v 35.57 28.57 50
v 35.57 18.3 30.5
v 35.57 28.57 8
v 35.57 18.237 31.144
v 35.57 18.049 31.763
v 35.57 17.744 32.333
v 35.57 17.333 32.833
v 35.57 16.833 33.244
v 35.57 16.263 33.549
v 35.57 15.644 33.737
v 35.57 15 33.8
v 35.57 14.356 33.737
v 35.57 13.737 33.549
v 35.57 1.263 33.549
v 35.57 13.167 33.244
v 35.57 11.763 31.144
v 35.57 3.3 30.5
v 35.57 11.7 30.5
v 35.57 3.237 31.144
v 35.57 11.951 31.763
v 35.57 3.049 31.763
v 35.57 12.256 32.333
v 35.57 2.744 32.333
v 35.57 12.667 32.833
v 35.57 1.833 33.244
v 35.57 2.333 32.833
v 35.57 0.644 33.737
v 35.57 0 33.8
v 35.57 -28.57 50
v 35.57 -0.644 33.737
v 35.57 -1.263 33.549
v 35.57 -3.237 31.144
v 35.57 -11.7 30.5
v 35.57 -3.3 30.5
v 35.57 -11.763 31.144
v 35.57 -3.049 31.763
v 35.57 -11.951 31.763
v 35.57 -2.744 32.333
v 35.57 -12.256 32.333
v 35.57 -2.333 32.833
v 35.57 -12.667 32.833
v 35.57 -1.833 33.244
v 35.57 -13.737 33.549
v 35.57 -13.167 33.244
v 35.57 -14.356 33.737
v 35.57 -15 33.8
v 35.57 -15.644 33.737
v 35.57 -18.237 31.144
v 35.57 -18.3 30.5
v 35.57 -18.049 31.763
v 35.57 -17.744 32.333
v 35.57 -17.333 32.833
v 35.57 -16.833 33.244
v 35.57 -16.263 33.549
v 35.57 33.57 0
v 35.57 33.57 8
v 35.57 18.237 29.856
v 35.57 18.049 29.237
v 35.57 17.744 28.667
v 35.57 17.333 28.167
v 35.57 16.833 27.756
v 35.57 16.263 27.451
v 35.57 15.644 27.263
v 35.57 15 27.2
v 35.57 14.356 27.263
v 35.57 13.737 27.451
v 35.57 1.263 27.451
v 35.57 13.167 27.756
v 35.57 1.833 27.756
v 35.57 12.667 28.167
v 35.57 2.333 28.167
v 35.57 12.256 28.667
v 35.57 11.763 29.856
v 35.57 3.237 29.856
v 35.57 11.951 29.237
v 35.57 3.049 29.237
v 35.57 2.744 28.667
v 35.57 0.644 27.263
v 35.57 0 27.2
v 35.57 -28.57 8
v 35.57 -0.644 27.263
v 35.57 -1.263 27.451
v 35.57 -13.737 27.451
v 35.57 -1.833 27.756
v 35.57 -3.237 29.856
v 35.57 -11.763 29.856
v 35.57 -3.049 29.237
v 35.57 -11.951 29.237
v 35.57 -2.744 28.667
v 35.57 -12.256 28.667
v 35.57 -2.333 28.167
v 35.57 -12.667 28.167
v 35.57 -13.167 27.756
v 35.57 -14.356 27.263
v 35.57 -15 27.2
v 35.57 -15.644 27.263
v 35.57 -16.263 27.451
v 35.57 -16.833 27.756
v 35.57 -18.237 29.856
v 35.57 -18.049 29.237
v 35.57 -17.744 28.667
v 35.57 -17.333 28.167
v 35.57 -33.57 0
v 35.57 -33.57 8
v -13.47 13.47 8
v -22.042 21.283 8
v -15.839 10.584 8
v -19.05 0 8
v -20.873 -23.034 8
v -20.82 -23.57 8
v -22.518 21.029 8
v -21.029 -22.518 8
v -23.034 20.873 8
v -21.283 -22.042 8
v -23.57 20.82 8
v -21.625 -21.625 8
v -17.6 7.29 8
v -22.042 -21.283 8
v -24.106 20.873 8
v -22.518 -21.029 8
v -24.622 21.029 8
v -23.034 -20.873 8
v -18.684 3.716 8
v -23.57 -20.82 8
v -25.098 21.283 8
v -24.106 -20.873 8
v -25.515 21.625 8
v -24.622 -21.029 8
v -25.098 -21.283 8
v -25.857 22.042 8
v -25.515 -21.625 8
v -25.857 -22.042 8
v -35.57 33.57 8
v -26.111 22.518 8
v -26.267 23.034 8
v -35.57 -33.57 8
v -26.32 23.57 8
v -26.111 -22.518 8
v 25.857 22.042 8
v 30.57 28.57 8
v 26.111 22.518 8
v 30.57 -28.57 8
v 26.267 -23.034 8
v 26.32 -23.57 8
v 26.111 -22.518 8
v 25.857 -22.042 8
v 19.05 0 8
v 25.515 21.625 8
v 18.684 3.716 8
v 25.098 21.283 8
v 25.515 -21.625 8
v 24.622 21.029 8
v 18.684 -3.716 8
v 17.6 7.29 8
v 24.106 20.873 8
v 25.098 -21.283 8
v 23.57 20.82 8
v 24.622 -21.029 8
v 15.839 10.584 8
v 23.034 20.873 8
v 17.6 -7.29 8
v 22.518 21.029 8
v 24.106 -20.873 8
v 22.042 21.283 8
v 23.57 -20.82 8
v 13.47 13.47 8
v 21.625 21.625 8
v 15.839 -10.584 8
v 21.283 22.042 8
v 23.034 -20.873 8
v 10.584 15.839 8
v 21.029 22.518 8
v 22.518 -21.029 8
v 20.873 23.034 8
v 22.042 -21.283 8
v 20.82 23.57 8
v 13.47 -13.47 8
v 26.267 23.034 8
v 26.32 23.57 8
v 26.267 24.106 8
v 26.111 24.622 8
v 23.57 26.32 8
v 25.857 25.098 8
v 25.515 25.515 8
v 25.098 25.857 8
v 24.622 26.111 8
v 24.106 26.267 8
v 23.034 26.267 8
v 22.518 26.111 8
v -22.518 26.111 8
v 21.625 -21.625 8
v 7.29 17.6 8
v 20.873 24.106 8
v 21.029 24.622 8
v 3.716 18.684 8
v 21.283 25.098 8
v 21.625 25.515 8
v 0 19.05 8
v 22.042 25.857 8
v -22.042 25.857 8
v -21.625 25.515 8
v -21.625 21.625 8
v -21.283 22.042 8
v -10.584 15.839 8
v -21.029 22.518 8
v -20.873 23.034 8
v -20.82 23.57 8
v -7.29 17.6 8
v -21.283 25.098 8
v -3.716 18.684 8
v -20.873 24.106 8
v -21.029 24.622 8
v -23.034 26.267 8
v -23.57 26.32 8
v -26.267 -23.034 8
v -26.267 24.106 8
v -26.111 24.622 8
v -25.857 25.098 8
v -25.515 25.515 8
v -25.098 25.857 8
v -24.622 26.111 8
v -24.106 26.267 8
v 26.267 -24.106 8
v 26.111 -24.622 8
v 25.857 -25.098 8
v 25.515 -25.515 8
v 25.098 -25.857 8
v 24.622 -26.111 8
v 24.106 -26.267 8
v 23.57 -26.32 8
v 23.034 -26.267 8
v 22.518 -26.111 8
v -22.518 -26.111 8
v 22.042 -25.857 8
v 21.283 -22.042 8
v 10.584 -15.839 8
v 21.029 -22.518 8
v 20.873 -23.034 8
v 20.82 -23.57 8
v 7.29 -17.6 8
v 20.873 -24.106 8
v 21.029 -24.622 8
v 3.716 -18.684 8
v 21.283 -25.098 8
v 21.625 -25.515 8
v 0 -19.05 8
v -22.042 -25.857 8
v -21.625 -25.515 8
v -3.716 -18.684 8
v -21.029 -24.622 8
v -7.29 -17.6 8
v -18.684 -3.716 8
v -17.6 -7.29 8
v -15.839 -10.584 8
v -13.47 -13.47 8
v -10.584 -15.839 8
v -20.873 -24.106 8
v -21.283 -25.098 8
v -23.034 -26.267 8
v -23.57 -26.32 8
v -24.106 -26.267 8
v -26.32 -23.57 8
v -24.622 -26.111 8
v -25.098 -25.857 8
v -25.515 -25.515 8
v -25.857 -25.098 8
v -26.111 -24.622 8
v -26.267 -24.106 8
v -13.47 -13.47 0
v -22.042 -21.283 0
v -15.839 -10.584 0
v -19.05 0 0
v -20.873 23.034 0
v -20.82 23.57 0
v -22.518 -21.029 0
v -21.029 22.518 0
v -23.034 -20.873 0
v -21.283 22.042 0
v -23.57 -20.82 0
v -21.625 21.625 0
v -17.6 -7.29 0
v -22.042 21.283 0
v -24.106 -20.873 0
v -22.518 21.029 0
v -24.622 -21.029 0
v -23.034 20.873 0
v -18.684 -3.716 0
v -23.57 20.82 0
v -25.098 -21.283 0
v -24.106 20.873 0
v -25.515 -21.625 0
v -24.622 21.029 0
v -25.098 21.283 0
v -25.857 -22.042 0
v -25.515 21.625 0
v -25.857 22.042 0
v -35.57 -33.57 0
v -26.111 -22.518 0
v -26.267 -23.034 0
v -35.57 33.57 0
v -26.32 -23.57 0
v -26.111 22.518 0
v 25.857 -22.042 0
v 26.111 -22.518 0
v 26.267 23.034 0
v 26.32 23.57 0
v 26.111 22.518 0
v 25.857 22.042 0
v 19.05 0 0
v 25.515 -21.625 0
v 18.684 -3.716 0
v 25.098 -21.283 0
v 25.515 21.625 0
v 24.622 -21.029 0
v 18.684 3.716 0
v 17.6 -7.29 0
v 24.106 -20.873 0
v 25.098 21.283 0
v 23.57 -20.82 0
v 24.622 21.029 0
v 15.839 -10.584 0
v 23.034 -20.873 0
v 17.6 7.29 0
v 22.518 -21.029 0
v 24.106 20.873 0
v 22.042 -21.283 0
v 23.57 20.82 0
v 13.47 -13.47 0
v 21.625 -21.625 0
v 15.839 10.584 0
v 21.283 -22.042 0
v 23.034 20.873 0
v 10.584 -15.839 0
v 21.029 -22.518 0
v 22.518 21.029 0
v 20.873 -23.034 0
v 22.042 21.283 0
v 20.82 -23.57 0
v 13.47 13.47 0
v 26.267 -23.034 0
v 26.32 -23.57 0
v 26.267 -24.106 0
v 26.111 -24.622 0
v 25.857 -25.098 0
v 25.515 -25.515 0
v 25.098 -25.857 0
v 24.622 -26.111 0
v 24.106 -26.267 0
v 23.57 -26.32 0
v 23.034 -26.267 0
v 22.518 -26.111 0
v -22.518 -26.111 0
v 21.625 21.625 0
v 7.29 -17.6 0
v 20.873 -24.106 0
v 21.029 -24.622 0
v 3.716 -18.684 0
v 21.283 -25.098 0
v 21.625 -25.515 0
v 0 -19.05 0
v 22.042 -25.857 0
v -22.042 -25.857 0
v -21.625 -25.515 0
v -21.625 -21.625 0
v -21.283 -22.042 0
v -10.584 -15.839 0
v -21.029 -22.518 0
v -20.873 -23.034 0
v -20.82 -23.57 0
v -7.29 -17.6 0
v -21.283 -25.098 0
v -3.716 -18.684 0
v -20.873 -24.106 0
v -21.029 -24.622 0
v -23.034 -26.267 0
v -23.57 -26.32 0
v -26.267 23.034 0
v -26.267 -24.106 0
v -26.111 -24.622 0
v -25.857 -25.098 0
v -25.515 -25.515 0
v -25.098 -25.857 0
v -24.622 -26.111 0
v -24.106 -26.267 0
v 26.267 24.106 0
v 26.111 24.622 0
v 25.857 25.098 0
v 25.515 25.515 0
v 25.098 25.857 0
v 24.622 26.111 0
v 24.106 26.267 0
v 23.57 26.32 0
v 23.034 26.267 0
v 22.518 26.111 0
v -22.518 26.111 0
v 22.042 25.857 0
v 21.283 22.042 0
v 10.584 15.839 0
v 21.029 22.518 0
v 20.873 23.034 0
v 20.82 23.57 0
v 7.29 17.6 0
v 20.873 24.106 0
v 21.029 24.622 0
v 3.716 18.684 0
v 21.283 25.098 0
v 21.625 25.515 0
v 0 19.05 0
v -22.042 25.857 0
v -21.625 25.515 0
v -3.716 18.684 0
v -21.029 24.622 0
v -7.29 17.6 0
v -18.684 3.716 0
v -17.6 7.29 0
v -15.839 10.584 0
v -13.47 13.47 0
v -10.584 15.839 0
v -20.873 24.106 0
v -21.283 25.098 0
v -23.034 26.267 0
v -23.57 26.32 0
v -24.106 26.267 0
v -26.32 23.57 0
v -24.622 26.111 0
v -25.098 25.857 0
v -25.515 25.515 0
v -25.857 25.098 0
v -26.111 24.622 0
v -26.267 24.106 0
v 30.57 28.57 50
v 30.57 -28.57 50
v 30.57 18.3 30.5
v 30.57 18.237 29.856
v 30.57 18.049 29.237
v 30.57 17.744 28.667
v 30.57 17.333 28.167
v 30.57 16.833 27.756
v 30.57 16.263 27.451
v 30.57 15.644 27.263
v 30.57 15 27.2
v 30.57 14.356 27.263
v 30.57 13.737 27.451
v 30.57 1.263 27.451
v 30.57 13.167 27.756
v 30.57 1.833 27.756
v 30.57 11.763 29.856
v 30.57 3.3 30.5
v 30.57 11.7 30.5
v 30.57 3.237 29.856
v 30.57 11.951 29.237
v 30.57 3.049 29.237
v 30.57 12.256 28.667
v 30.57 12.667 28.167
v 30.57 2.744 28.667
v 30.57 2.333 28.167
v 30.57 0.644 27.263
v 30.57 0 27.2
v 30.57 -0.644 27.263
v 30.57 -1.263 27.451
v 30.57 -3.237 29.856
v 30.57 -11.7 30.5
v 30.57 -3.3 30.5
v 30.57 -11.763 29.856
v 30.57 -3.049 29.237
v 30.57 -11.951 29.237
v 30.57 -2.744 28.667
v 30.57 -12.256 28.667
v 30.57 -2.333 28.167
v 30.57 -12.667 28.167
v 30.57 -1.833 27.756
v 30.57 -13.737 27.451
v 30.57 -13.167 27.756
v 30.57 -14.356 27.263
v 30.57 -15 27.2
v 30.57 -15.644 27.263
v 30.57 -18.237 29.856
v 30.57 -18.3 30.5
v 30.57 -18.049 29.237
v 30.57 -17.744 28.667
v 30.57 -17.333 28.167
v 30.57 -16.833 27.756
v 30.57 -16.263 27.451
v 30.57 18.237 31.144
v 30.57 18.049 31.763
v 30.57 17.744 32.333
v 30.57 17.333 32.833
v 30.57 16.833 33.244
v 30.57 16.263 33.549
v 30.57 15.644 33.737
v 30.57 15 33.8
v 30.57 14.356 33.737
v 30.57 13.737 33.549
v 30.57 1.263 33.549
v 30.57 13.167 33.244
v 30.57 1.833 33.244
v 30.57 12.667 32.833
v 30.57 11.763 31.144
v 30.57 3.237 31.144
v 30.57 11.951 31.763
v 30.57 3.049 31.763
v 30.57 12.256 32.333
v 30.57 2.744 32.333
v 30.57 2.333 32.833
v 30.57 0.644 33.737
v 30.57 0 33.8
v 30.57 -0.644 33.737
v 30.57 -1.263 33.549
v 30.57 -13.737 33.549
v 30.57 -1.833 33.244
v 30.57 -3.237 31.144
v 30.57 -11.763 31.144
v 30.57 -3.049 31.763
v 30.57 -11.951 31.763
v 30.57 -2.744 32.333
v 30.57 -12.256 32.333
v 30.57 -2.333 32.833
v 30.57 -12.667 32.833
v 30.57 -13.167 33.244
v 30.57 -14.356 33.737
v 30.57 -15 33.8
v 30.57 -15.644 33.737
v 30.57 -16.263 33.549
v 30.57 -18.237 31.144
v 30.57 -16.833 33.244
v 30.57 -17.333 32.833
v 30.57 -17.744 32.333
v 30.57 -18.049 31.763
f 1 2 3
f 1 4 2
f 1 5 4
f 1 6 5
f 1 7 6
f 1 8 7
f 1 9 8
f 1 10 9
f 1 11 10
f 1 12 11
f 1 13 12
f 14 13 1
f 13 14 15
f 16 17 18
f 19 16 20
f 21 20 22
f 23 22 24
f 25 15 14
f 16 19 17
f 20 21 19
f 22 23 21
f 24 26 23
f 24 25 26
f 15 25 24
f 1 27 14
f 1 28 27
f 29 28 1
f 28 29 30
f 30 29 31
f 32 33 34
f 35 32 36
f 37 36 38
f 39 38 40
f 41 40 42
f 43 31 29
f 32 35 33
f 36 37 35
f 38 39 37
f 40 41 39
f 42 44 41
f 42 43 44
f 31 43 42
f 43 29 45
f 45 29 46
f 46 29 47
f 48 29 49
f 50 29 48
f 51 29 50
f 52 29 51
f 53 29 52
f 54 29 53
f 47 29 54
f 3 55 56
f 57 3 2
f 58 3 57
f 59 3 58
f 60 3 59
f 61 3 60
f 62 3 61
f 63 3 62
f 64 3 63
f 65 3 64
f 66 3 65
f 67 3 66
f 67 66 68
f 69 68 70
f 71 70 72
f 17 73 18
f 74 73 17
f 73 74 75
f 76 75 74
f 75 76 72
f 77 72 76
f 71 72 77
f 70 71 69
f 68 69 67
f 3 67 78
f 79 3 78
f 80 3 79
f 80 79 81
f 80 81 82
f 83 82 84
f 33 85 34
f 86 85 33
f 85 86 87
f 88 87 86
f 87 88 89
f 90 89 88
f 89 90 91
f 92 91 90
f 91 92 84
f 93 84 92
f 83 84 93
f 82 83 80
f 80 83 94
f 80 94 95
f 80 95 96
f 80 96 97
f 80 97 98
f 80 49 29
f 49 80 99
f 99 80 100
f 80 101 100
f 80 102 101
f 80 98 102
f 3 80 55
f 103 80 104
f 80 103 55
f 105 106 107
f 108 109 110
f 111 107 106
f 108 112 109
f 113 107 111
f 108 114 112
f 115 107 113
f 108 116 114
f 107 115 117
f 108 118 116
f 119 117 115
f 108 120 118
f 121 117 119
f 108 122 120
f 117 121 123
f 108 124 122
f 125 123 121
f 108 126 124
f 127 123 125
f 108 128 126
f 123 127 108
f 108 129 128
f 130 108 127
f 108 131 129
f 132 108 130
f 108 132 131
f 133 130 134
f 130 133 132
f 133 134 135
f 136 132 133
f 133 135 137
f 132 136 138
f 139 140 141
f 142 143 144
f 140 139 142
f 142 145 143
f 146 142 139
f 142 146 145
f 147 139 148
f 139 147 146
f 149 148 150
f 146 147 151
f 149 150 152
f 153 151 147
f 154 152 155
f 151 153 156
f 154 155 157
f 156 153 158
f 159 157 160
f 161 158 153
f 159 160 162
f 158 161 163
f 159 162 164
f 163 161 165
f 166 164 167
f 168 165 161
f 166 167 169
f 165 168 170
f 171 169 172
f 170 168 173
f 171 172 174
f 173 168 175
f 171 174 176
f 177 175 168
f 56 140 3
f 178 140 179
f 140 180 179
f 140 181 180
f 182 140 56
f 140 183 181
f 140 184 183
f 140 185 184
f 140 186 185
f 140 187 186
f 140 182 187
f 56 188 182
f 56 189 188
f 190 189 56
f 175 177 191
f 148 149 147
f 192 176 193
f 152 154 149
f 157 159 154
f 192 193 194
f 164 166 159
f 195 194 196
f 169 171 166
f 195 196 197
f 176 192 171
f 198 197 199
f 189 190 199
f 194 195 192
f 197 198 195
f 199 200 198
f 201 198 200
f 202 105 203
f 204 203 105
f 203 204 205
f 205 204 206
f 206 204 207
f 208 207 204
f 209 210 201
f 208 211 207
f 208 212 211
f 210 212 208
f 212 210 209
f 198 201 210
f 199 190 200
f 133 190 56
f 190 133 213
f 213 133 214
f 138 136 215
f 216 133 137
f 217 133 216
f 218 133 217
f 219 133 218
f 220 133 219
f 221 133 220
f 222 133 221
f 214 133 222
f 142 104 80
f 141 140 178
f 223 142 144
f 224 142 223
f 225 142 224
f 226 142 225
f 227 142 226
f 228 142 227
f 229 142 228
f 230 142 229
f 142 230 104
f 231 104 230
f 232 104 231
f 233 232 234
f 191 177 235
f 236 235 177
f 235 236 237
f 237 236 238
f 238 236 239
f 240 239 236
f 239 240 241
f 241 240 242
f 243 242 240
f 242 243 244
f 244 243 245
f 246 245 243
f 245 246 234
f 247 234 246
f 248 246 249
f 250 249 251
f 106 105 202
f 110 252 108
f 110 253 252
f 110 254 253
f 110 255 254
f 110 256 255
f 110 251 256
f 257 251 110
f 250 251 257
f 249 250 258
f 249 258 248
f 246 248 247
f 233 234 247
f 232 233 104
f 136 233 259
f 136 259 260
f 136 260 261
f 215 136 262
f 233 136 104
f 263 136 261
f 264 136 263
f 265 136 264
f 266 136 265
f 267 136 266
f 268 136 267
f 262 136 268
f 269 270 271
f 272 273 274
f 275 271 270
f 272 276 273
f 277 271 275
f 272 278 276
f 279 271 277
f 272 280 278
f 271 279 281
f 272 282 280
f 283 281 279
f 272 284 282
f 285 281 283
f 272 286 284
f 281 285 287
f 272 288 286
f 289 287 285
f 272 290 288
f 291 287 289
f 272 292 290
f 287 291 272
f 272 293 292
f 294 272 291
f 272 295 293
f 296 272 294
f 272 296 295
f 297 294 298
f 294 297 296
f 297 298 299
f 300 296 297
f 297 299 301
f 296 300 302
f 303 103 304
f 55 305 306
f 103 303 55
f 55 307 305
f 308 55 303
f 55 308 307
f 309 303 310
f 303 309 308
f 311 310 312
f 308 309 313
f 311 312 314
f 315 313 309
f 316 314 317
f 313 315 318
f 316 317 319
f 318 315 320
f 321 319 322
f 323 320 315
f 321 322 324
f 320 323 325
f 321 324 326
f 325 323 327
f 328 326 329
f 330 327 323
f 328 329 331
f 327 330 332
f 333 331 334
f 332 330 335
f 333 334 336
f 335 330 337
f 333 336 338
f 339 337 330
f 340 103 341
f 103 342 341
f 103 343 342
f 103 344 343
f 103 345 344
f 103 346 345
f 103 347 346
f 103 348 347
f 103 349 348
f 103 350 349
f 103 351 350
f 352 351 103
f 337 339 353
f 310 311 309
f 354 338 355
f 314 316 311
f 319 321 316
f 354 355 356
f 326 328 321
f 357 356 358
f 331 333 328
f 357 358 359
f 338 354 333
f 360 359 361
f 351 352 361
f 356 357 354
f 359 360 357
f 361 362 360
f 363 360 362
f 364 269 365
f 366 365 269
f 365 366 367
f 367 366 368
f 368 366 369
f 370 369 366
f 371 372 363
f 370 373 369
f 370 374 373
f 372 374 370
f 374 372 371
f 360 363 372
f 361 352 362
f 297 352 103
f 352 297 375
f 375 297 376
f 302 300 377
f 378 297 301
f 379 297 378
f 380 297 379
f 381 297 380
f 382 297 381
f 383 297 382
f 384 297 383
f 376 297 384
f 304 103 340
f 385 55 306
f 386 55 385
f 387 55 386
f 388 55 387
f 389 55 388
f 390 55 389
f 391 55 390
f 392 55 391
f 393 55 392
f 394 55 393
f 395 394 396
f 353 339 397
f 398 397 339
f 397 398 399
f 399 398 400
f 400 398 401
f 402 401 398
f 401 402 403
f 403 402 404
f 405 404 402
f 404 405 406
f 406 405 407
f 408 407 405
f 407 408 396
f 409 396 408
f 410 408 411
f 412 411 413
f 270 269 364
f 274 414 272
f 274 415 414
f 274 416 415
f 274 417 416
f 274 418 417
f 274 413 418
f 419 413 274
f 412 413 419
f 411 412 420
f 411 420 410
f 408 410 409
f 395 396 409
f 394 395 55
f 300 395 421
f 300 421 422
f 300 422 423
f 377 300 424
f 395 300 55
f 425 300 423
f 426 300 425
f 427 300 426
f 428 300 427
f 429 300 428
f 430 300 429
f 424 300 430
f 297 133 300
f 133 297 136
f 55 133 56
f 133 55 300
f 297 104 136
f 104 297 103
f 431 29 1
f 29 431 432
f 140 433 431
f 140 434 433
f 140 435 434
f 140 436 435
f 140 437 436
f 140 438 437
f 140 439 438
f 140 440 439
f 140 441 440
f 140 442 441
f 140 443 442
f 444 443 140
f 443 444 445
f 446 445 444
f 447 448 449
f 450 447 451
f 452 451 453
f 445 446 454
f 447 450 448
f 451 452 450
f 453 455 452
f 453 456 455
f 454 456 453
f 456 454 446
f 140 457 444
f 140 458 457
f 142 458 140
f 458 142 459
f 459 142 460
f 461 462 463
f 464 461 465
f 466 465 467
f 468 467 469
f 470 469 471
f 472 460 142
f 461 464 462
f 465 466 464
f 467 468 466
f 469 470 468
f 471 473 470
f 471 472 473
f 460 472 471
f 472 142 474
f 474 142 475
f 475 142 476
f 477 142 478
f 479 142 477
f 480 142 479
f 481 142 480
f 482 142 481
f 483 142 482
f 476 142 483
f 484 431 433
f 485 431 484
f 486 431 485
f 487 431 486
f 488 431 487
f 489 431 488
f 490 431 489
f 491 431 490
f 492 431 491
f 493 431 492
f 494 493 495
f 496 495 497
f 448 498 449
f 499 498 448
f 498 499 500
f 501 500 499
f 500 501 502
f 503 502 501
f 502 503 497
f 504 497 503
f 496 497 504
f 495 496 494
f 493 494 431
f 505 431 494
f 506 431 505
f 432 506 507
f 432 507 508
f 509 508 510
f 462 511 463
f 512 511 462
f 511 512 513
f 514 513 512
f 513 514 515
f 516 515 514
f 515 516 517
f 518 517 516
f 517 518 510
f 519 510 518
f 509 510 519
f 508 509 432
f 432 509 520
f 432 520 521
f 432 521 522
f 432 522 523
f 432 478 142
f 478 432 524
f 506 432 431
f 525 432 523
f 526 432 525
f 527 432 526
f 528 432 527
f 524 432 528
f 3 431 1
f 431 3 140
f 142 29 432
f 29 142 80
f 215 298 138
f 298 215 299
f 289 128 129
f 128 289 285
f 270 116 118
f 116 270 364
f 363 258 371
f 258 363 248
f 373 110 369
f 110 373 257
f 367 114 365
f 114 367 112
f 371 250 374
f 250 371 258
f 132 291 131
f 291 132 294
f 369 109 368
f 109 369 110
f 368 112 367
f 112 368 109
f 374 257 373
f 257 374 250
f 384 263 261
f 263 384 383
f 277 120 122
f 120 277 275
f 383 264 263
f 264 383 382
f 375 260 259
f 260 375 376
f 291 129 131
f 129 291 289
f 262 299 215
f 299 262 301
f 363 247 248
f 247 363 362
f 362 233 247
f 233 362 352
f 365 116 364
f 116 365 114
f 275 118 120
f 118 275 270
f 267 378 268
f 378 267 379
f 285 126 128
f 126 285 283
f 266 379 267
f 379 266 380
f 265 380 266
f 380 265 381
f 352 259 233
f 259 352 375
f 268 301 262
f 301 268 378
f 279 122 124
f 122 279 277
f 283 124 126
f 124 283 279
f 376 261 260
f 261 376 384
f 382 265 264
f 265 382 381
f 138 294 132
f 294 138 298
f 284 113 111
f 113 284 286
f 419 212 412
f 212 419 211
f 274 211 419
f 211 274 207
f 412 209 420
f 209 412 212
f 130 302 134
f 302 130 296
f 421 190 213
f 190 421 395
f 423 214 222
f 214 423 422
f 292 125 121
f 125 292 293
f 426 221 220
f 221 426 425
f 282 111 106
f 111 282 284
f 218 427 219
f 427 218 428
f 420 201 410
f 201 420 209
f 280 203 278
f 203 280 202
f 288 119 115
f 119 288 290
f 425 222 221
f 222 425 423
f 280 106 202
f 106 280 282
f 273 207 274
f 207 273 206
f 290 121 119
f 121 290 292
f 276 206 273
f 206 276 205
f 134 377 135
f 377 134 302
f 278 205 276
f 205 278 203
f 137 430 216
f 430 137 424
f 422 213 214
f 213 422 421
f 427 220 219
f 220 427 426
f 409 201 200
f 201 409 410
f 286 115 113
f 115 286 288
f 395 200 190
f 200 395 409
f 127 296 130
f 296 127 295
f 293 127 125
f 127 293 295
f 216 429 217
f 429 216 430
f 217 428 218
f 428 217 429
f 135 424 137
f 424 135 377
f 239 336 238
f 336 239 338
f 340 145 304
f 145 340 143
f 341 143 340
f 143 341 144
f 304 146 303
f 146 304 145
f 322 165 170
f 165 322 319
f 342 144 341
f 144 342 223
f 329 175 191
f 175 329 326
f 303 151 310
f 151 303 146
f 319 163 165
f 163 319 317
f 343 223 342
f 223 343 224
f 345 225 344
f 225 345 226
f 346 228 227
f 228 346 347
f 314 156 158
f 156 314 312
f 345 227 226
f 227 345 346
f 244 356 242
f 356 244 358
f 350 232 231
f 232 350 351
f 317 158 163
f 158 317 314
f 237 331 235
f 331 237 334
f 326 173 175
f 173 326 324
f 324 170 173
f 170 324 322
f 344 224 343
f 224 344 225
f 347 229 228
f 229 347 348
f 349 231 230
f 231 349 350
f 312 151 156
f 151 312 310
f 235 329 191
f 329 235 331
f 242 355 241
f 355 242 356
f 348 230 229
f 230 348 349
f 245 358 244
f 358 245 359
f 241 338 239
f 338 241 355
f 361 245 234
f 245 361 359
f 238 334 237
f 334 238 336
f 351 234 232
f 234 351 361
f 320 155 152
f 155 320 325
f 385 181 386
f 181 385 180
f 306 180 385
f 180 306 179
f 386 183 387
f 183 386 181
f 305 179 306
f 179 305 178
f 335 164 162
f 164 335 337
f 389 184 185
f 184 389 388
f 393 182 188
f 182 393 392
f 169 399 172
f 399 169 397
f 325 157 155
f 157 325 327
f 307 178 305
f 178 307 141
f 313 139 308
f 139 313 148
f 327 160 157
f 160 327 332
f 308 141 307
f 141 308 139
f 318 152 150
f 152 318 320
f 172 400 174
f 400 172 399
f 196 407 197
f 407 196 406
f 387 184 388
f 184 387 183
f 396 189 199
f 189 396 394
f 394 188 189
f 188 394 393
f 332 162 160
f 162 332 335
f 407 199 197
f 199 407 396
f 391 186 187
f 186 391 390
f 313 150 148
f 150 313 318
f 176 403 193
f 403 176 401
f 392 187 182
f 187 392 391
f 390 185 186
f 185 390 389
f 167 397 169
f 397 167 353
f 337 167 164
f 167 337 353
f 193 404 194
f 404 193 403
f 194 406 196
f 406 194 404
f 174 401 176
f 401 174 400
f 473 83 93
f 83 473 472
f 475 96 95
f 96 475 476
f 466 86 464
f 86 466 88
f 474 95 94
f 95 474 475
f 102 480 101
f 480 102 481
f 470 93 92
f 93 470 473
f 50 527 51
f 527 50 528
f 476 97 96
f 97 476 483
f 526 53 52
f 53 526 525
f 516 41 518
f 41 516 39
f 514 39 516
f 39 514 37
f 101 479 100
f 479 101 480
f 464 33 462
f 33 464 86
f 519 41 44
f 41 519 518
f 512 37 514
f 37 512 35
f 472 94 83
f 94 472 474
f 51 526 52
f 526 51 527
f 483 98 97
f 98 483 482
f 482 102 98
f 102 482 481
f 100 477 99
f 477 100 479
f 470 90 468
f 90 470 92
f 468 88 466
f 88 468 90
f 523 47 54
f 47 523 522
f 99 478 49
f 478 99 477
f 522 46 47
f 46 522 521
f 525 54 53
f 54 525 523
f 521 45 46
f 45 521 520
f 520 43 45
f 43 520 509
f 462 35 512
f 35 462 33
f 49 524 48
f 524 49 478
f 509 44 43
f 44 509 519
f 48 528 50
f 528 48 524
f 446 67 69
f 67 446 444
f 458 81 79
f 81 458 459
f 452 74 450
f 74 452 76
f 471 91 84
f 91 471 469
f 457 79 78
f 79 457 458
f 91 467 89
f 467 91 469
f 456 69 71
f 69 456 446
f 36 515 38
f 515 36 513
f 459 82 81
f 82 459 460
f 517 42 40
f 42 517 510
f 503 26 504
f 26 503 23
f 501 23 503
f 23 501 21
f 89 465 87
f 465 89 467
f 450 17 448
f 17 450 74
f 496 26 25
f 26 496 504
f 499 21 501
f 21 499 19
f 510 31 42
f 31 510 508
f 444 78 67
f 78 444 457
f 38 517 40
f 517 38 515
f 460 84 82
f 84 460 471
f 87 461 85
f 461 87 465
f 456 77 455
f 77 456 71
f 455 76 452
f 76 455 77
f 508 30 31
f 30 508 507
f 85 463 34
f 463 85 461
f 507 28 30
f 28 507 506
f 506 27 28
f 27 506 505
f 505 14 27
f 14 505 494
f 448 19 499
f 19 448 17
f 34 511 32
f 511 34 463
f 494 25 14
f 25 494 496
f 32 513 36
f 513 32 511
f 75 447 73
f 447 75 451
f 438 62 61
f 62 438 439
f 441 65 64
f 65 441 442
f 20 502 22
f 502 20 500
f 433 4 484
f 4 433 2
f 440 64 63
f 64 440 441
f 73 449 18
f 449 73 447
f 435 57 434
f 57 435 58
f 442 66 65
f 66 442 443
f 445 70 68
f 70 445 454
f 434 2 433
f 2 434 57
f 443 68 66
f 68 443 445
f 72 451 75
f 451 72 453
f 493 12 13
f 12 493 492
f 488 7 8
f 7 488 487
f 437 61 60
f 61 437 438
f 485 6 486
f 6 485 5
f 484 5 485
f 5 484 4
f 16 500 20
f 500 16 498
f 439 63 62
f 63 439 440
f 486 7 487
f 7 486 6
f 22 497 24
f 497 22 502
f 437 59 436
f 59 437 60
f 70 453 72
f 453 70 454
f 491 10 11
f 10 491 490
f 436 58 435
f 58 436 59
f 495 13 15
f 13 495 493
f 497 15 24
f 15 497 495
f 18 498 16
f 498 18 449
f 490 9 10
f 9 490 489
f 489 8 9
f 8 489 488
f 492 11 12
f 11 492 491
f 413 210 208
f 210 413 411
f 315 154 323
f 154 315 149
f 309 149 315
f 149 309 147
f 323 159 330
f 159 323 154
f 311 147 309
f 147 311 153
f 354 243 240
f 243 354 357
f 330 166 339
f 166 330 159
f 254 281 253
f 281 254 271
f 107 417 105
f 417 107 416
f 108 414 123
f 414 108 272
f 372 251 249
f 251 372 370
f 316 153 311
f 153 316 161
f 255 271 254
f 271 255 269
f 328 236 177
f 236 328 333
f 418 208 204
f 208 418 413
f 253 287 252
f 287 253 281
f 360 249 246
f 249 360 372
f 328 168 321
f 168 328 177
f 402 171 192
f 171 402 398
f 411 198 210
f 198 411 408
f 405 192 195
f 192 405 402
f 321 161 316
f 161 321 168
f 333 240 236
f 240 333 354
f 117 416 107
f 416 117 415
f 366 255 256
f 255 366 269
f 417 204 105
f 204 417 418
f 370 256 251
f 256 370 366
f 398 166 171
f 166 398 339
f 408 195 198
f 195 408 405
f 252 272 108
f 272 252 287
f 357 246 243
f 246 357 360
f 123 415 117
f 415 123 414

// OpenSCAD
$fn = 32;

// ----------------------------------------------------------------------
// Motor mount plate: NEMA23, 71.14 x 67.14 x 58 mm
// ----------------------------------------------------------------------

// --- parameters (mm) ---
mount_w = 71.14;          // plate length, X
mount_d = 67.14;          // plate width, Y
mat_t = 8;                // plate thickness
motor_pitch = 47.14;      // NEMA23 bolt spacing
motor_d = 5.5;            // NEMA23 screw clearance
center_bore = 38.1;       // pilot boss bore
second_d = 6.6;           // second fastener hole
wall_h = 50;              // upright height
wall_t = 5;               // upright thickness

module plate() {
  translate([-mount_w / 2, -mount_d / 2, 0]) cube([mount_w, mount_d, mat_t]);
}

module motor_holes() {
  for (sx = [-1, 1]) for (sy = [-1, 1])
    translate([sx * motor_pitch / 2, sy * motor_pitch / 2, -1])
      cylinder(h = mat_t + 2, d = motor_d);
}
module upright() {
  /* wall sunk 1 mm into the plate for a positive overlap */
  translate([mount_w / 2 - wall_t, -mount_d / 2 + wall_t, mat_t - 1])
    cube([wall_t, mount_d - 2 * wall_t, wall_h - mat_t + 1]);
}

difference() {
  union() {
    plate();
    upright();
  }
  motor_holes();
  translate([0, 0, -1]) cylinder(h = mat_t + 2, d = center_bore);
  for (i = [0 : 2])
    translate([mount_w / 2 - wall_t - 1, (i - 1) * wall_h * 0.3, mat_t + wall_h * 0.45]) rotate([0, 90, 0]) cylinder(h = wall_t + 2, d = second_d);
}
